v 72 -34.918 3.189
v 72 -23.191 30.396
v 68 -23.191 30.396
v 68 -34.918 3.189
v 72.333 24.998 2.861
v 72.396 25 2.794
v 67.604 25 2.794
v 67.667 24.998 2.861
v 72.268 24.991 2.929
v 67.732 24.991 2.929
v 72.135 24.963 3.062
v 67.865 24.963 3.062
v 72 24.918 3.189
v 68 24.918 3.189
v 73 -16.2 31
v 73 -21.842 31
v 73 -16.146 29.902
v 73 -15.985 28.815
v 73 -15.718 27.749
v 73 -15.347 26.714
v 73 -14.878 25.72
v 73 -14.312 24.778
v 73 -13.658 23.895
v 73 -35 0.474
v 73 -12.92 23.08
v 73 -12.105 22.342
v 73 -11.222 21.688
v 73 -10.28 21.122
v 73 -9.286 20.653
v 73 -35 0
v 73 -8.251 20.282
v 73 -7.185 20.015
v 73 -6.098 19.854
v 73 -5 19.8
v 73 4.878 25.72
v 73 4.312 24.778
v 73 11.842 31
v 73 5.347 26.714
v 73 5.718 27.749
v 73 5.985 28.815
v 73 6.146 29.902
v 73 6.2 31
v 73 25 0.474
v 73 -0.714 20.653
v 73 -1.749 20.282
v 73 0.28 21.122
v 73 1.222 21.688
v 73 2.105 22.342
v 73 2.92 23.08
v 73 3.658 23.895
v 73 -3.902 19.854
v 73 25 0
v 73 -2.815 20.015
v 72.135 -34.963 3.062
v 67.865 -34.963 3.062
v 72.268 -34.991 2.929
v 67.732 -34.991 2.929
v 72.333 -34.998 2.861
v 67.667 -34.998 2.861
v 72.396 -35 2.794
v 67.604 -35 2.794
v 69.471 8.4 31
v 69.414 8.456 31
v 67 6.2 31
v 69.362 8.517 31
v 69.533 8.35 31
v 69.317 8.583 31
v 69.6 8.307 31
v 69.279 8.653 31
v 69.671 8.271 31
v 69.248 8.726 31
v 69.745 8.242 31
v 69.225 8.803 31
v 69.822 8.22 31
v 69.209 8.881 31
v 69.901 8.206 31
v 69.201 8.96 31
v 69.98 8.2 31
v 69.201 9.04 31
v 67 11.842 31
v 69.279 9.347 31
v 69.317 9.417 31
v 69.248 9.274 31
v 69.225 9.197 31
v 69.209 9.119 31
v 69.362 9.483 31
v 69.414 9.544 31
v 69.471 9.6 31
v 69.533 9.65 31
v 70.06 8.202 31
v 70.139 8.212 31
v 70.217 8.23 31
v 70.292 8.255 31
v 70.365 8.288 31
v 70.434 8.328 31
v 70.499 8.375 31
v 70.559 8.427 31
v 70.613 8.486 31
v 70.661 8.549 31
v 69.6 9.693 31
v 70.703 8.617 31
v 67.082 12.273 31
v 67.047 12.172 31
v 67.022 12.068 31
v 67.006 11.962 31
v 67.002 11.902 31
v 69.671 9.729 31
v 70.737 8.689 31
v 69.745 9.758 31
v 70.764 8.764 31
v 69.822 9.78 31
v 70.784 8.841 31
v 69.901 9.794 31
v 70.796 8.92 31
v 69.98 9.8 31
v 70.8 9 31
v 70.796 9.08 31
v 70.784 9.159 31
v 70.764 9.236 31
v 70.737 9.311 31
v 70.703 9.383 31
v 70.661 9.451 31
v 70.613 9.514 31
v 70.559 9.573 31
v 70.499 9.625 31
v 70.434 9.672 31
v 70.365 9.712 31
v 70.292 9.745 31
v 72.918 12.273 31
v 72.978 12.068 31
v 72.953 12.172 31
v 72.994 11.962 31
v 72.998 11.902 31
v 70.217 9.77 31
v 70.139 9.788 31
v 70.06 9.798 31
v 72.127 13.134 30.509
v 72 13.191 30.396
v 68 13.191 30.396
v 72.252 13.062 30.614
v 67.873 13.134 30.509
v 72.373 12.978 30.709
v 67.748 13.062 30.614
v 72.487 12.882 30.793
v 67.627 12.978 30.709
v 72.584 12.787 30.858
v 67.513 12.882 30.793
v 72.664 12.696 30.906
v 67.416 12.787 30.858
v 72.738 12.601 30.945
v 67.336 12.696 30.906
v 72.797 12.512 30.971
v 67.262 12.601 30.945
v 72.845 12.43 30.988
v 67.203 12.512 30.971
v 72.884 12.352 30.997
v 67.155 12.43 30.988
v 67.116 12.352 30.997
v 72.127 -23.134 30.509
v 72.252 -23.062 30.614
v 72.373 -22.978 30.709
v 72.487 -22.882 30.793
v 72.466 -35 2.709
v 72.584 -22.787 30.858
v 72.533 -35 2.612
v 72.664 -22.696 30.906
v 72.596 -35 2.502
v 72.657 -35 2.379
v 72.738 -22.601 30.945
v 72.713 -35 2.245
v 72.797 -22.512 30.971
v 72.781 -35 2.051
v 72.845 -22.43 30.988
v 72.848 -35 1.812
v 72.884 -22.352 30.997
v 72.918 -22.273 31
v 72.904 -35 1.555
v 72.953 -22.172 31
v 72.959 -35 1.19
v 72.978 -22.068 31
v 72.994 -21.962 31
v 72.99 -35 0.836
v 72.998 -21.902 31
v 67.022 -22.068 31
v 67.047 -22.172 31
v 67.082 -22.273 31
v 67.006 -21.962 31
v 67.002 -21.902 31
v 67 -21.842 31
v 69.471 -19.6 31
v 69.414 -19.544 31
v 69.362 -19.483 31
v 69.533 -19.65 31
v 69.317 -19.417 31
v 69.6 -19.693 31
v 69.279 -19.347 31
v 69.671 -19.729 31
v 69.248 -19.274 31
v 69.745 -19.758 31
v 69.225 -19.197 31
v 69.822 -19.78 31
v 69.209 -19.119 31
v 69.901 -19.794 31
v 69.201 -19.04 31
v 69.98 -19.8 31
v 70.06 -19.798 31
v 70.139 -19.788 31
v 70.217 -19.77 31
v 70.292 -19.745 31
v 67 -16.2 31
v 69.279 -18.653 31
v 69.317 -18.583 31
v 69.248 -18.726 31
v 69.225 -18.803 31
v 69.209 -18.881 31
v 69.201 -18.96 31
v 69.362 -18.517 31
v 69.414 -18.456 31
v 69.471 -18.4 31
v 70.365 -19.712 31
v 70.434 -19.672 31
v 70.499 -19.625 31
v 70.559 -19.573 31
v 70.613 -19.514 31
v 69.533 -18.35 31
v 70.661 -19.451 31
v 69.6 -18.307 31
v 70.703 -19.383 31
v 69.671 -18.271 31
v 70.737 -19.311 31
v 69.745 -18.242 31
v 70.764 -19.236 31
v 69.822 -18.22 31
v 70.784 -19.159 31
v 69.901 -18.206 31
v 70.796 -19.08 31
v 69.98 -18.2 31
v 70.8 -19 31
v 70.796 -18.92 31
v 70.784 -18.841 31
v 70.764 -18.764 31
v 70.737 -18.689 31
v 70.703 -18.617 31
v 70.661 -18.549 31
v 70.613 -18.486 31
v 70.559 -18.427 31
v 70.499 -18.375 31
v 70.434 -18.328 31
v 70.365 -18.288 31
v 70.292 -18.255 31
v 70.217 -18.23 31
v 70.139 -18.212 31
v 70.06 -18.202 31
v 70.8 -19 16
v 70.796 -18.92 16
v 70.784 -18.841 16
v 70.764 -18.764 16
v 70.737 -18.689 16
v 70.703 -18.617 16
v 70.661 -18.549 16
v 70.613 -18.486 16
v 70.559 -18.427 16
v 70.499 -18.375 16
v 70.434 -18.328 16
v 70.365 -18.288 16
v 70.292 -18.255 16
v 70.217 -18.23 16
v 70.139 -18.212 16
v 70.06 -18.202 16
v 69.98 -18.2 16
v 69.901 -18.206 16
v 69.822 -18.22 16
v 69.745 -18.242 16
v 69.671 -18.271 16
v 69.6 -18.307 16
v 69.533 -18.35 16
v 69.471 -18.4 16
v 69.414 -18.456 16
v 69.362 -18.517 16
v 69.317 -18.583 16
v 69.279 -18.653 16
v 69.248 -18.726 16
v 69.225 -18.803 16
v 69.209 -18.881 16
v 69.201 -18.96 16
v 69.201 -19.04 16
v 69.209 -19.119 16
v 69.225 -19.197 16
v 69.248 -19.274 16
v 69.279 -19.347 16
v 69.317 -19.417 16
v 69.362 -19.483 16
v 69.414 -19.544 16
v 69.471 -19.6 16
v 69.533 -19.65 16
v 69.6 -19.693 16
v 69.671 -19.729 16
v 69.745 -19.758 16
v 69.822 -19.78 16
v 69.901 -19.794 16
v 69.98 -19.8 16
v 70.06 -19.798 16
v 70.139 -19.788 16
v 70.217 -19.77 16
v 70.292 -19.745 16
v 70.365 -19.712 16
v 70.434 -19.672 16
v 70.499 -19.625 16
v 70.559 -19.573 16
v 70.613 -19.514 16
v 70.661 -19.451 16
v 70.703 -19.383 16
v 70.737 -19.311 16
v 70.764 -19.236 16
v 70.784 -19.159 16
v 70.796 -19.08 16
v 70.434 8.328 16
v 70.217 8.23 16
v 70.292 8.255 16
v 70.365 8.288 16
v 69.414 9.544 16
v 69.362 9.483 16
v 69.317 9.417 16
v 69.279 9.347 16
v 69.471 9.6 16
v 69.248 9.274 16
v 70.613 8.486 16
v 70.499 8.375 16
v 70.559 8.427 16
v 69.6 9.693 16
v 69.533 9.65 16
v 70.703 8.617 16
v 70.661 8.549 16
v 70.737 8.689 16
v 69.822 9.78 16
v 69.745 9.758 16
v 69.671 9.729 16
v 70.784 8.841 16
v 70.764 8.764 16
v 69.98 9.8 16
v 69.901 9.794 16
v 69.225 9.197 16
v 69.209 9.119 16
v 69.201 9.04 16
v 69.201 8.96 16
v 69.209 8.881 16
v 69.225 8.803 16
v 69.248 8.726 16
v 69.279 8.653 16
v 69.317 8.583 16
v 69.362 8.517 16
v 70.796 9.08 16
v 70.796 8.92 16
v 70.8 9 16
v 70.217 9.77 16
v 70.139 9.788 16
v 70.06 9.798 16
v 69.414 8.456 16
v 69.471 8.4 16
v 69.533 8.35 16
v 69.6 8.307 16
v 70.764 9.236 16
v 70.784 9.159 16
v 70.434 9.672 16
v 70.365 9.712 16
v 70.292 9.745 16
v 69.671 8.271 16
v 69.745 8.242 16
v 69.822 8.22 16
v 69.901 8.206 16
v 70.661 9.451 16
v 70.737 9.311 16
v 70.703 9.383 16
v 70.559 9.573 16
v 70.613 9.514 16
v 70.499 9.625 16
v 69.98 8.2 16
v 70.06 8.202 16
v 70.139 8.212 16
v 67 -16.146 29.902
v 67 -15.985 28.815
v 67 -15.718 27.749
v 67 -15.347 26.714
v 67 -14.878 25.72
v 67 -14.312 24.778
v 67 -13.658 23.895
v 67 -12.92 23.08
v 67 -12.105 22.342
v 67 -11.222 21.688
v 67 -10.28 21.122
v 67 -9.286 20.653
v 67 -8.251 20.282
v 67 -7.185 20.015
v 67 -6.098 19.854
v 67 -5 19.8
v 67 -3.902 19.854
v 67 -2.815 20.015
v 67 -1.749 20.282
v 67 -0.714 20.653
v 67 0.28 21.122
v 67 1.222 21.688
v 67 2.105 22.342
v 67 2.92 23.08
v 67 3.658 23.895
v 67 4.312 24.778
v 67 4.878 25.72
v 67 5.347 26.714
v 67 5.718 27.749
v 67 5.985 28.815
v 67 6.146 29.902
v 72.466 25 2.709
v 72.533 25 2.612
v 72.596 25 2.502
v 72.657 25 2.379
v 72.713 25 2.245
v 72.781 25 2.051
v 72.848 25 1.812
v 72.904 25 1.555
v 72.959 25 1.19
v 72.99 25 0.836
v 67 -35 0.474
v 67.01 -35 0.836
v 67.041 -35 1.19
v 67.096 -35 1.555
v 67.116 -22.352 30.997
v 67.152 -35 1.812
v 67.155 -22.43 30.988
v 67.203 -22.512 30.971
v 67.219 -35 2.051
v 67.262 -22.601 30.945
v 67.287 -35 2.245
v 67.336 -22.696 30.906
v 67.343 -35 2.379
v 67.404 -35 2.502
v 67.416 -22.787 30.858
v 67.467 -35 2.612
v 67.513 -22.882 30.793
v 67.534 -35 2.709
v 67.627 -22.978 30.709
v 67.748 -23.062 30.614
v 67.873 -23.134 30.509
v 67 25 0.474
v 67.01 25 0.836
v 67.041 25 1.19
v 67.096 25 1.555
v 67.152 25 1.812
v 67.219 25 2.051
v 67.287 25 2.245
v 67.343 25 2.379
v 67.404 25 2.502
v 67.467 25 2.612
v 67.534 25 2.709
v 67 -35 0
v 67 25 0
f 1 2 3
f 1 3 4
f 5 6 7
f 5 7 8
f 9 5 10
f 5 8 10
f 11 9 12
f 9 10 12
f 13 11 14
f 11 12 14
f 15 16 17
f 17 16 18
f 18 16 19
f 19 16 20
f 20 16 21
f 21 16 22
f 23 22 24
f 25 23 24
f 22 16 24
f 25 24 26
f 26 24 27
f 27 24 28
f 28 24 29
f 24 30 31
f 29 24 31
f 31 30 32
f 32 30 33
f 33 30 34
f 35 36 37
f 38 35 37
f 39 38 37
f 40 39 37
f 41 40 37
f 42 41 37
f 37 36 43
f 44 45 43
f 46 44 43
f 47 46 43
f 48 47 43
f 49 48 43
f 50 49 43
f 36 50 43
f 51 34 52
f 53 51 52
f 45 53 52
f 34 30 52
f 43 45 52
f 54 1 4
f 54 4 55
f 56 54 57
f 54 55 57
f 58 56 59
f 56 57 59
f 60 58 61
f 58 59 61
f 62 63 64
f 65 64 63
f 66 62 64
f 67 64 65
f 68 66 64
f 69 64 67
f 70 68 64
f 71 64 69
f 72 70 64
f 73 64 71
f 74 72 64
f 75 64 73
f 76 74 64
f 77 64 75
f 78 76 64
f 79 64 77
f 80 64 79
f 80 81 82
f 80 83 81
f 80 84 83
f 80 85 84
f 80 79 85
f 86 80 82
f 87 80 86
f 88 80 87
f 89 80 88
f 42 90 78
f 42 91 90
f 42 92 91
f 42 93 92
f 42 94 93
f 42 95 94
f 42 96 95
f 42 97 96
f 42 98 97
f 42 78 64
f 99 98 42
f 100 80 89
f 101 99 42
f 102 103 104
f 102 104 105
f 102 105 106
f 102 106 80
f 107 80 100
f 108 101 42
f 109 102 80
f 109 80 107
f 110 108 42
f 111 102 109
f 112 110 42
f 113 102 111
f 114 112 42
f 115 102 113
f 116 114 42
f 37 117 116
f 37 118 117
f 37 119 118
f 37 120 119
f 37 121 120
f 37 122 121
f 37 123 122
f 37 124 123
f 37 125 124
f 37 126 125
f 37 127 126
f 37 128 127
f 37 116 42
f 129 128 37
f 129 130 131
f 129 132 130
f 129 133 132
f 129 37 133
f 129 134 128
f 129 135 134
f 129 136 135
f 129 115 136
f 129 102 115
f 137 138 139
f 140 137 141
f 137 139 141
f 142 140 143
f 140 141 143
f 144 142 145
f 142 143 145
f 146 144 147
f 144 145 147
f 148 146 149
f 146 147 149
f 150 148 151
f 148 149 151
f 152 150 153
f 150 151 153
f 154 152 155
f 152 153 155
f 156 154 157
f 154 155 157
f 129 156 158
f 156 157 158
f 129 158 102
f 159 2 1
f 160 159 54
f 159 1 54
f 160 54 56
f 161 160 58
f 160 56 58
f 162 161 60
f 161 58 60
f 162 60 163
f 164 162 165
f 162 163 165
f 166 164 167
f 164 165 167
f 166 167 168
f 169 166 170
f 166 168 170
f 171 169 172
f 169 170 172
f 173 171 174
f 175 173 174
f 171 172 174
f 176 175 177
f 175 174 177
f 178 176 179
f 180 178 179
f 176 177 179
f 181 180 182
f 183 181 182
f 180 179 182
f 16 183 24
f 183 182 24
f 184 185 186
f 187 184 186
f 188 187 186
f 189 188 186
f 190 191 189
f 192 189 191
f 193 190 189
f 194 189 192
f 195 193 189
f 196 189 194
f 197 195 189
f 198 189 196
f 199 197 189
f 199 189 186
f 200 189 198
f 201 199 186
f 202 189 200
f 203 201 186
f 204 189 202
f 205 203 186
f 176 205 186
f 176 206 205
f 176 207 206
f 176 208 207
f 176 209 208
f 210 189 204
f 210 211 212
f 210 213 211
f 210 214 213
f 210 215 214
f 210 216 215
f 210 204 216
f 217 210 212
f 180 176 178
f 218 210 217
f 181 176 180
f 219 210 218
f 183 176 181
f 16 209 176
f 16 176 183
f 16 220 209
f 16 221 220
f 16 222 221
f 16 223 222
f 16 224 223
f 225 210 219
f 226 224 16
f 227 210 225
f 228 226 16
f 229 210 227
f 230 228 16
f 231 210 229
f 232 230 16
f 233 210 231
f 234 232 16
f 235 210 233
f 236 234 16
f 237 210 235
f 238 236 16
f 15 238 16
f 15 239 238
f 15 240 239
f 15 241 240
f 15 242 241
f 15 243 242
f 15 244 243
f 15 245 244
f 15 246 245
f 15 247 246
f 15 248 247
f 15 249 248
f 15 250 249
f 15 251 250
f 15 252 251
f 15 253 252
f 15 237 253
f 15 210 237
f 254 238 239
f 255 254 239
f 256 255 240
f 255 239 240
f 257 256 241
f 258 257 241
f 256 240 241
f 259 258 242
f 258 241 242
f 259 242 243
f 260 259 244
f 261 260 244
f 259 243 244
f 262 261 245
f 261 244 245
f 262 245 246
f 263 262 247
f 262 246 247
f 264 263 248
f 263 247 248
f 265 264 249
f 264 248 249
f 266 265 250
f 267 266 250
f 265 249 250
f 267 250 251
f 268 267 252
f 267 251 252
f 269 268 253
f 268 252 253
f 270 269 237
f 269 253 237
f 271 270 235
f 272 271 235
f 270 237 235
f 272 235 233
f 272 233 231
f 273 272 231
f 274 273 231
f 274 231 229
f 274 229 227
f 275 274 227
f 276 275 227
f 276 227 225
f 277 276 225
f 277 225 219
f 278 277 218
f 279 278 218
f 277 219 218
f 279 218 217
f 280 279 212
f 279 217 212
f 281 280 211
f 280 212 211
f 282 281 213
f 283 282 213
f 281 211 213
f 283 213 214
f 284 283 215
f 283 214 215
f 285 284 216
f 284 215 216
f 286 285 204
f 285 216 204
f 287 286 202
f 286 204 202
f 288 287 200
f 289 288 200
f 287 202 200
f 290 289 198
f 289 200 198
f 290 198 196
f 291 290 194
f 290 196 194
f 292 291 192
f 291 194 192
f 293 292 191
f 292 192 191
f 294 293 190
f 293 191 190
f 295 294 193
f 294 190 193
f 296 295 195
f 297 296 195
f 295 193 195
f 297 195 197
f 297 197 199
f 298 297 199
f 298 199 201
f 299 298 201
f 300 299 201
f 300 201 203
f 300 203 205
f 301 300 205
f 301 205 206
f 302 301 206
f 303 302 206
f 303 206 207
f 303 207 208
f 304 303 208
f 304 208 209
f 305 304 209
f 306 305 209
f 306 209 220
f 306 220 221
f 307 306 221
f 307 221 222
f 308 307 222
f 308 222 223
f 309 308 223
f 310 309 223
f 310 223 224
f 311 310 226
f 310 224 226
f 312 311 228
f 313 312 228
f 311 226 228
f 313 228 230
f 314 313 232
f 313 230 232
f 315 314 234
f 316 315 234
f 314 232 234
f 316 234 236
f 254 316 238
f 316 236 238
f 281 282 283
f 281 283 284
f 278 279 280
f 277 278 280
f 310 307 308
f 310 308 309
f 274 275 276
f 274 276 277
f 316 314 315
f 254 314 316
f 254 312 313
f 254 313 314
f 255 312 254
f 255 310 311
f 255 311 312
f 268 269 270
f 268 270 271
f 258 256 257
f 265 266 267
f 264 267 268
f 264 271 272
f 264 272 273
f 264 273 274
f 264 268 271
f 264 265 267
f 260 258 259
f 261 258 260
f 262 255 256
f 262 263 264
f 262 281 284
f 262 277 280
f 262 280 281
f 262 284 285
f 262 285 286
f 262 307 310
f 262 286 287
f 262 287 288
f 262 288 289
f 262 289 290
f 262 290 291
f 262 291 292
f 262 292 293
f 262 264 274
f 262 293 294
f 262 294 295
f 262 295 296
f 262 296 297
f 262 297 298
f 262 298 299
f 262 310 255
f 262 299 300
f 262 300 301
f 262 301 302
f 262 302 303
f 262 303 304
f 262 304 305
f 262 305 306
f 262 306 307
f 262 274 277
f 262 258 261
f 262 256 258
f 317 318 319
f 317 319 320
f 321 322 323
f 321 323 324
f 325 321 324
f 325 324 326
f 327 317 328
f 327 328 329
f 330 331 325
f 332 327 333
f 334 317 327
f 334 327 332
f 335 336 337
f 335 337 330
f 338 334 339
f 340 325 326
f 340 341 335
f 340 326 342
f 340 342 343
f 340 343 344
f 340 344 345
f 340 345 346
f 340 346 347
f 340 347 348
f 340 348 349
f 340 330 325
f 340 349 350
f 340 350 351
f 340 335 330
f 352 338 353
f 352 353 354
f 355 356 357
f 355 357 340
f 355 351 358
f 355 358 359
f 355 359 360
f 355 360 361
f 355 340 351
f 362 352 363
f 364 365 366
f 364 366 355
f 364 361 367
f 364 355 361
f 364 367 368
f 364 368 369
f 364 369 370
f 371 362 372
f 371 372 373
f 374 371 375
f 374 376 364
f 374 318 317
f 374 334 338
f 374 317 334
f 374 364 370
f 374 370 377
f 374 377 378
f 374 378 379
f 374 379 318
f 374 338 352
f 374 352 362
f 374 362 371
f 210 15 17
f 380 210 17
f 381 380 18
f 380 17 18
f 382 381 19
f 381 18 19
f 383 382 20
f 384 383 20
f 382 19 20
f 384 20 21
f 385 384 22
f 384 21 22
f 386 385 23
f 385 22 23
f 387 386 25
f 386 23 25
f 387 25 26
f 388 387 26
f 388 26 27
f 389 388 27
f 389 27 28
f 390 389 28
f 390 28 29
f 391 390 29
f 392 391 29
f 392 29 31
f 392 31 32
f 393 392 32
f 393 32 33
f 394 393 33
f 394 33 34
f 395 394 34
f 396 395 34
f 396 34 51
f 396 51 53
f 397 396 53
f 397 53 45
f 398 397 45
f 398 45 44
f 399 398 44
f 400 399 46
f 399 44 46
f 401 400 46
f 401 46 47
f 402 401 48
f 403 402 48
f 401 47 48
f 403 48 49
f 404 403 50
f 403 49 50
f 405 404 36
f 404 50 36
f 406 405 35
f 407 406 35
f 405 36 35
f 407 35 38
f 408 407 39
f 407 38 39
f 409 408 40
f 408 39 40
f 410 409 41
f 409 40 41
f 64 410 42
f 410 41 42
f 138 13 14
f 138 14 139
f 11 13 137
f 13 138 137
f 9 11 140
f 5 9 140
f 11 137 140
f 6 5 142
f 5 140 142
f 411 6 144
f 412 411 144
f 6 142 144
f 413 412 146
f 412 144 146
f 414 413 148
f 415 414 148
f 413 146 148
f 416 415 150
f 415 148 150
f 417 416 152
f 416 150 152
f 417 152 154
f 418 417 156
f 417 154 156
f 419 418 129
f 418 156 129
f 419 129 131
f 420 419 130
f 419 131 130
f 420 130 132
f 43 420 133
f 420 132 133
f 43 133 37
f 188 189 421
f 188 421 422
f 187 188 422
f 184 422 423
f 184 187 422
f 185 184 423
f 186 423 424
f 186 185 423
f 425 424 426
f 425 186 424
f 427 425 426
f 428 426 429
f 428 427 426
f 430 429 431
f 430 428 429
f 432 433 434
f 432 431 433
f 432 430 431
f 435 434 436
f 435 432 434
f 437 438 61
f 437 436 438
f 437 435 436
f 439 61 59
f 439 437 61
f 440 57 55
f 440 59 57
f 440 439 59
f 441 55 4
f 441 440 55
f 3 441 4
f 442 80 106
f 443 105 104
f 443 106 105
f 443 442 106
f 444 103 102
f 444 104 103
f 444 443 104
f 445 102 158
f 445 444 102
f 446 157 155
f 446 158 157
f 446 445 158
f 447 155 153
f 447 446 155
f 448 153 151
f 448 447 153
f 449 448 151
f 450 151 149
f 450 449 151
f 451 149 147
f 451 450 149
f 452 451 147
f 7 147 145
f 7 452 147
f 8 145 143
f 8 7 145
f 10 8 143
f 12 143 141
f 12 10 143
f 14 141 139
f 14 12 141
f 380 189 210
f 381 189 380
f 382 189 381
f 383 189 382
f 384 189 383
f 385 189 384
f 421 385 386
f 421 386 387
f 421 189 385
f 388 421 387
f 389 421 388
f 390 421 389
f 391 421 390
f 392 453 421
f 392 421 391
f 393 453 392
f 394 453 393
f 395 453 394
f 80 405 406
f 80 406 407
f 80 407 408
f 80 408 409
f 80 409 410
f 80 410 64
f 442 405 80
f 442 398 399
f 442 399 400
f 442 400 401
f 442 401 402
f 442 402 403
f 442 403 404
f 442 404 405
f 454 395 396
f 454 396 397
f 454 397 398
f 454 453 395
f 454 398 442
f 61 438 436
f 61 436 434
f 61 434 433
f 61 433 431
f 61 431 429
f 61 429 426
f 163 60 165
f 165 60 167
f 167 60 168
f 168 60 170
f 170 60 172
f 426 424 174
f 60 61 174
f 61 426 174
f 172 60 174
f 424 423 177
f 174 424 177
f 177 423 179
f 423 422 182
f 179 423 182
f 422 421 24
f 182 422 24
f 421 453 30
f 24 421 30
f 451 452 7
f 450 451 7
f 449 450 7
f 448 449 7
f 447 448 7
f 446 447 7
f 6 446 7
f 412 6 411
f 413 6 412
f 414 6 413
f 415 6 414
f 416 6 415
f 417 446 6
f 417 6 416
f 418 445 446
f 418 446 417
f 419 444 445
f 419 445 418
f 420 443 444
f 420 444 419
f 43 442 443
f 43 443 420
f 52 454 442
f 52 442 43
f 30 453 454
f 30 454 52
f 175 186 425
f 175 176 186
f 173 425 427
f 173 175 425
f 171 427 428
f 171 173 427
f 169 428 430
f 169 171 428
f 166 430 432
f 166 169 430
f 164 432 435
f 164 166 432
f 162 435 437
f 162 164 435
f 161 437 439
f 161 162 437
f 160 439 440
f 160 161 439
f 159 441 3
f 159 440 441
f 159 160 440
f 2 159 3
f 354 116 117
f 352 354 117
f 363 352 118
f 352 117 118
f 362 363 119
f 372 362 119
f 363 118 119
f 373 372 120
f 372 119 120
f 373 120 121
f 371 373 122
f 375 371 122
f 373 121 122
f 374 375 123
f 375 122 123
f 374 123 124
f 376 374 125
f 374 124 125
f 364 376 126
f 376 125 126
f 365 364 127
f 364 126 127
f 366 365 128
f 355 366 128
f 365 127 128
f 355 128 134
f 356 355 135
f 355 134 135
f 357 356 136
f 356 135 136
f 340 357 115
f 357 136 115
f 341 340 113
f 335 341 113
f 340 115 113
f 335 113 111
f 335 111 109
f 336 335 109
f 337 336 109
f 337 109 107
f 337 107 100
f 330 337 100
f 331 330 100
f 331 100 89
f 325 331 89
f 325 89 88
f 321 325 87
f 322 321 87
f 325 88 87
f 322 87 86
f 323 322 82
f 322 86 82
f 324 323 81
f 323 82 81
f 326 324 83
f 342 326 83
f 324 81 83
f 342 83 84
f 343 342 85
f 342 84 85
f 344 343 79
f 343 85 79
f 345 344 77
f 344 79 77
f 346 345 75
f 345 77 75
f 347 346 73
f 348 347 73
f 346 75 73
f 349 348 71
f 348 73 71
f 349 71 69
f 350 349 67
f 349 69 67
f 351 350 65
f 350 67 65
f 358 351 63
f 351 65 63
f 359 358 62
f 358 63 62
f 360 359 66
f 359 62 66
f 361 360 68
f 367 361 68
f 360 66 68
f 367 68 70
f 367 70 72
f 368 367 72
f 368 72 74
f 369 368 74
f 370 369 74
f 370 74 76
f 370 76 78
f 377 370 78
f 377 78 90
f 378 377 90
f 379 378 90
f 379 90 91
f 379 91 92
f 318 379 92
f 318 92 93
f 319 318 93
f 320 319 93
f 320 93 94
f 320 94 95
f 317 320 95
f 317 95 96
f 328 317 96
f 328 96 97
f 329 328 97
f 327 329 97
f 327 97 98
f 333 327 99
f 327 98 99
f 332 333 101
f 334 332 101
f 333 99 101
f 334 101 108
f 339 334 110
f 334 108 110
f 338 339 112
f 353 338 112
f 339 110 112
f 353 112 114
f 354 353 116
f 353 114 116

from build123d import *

# Parameters (mm, degrees)
SKETCH020_W     = 6
SKETCH020_H     = 60
PAD004_DEPTH    = 31
SKETCH021_R     = 11.2
POCKET_DEPTH    = 6.001
SKETCH028_R     = 0.8
POCKET010_DEPTH = 15
POCKET011_DEPTH = 6.001
FILLET_R        = 1


with BuildPart() as part:
    # Sketch020 → Pad004 (new body)
    with BuildSketch(Plane.XY):
        with Locations((70, -5)):
            Rectangle(SKETCH020_W, SKETCH020_H)
    extrude(amount=PAD004_DEPTH)

    # Sketch021 → Pocket (cut, through all)
    with BuildSketch(Plane.YZ.offset(73)):
        with Locations((-5, 31)):
            Circle(SKETCH021_R)
    extrude(amount=-POCKET_DEPTH, mode=Mode.SUBTRACT)

    # Sketch028 → Pocket010 (cut)
    with BuildSketch(Plane.XY.offset(31)):
        with Locations((70, 9)):
            Circle(SKETCH028_R)
        with Locations((70, -19)):
            Circle(SKETCH028_R)
    extrude(amount=-POCKET010_DEPTH, mode=Mode.SUBTRACT)

    # Sketch029 → Pocket011 (cut, through all)
    with BuildSketch(Plane.YZ.offset(73)):
        Polygon((25, 3), (12.5, 32), (-22.5, 32), (-35, 3), (-38.294894757, 52.1665199783), (33.061305243, 52.1665199783), align=None)
    extrude(amount=-POCKET011_DEPTH, mode=Mode.SUBTRACT)

    # Fillet
    fillet_edges = [part.edges().sort_by_distance(p)[0] for p in [
        (73, 18.965517, 17),
        (70, 12.931034, 31),
        (67, 18.965517, 17),
        (70, 25, 3),
        (73, -28.965517, 17),
        (70, -35, 3),
        (67, -28.965517, 17),
        (70, -22.931034, 31),
    ]]
    fillet(fillet_edges, radius=FILLET_R)


solid = part.part
